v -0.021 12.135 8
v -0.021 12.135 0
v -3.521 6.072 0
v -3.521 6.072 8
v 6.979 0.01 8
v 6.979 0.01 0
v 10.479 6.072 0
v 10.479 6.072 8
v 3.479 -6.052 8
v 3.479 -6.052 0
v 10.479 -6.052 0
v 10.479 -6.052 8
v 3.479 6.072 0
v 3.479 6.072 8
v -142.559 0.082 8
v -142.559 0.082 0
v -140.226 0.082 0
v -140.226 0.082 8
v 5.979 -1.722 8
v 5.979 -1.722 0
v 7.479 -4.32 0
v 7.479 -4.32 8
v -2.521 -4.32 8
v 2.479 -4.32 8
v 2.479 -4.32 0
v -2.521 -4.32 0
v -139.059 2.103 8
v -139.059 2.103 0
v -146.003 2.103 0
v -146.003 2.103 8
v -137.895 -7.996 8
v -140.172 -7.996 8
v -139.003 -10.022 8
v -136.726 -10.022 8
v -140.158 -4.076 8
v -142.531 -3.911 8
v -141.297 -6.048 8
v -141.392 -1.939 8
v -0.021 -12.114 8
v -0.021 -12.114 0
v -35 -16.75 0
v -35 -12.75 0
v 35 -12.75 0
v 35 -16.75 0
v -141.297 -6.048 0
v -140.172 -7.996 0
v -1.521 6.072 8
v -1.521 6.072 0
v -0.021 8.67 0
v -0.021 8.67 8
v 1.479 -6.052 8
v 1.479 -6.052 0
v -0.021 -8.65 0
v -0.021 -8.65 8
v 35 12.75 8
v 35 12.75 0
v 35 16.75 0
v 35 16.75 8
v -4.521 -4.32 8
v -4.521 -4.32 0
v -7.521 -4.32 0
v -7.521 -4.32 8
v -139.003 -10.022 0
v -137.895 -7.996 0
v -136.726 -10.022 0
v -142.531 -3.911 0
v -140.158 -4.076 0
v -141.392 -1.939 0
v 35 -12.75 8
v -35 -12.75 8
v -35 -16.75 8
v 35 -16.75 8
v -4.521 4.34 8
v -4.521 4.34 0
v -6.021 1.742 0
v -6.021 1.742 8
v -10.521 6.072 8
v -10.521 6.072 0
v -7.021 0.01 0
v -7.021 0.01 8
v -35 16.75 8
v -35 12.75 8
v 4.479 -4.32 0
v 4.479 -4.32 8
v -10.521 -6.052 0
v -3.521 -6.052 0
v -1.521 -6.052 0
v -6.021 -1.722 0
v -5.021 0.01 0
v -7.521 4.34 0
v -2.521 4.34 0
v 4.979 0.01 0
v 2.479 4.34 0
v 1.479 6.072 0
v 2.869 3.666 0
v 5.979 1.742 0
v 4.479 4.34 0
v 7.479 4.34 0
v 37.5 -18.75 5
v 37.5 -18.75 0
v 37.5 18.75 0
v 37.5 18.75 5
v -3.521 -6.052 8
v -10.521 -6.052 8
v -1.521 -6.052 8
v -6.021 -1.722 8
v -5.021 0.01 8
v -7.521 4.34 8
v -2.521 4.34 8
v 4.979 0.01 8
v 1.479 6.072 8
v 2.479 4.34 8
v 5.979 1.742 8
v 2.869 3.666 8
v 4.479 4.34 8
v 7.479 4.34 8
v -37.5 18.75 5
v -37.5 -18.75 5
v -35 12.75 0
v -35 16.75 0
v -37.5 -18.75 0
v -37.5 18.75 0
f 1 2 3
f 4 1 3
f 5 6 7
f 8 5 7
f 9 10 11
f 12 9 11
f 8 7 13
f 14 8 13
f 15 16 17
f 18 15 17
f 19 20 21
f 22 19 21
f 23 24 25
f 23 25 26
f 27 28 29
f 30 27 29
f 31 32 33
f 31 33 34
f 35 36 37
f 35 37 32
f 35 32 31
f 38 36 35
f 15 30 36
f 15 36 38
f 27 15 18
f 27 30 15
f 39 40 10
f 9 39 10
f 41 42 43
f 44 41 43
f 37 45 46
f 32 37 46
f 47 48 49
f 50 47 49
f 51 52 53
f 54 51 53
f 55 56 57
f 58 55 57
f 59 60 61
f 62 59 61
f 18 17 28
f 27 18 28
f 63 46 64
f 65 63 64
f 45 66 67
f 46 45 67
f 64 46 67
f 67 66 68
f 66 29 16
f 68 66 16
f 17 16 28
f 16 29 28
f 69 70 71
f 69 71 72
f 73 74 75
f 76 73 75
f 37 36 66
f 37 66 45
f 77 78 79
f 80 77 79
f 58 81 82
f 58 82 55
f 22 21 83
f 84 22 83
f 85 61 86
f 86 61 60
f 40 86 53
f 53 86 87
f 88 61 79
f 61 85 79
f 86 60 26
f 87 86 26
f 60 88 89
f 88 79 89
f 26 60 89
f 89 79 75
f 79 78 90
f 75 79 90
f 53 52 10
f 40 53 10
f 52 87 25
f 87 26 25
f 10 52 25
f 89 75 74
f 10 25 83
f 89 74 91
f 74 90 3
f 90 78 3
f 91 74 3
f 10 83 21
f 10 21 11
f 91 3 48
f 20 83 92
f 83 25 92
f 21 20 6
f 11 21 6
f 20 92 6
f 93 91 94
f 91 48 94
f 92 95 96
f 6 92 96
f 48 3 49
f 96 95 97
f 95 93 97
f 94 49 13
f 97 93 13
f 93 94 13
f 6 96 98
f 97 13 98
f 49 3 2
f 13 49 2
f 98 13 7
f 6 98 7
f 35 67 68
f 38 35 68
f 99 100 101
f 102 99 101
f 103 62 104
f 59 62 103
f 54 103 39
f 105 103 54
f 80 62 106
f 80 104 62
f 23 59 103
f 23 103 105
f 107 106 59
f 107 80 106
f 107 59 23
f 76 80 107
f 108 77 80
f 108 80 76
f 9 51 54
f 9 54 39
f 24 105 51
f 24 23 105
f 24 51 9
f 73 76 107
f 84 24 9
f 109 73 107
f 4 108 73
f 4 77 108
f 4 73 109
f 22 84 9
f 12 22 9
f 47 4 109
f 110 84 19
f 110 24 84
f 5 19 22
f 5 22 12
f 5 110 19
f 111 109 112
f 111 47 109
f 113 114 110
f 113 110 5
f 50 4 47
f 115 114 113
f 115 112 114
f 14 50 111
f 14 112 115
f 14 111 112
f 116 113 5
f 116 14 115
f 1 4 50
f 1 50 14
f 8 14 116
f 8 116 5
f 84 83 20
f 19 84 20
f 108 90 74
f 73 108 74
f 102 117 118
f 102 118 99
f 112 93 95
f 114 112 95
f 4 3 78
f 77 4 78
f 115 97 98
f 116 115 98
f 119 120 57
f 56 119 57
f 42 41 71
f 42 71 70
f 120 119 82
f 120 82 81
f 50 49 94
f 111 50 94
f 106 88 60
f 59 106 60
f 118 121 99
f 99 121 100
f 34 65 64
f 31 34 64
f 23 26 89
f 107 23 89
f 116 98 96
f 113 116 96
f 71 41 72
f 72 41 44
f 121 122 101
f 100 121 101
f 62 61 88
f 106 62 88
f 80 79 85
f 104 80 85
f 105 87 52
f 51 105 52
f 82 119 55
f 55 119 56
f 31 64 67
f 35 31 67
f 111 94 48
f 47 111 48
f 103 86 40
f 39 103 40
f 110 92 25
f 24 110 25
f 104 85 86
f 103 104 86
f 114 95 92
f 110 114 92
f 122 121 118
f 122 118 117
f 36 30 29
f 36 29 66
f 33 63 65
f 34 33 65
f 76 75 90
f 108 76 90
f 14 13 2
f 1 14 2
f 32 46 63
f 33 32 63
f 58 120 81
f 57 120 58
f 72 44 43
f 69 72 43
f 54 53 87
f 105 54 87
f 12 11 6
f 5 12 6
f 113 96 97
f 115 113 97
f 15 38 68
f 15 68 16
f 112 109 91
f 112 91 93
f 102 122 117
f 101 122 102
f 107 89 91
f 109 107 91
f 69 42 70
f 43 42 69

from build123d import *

# Parameters (mm, degrees)
F0_W     = 75
F0_H     = 37.5
F1_DEPTH = 5
F2_W     = 70
F2_H     = 4
F3_DEPTH = 8
F5_DEPTH = 8


with BuildPart() as f1:
    # F0 (on Top) → F1 (new body)
    with BuildSketch(Plane.XY):
        Rectangle(F0_W, F0_H)
    extrude(amount=F1_DEPTH)


with BuildPart() as f3:
    # F2 (on Top) → F3 (new body)
    with BuildSketch(Plane.XY):
        with Locations((0, 14.75)):
            Rectangle(F2_W, F2_H)
    extrude(amount=F3_DEPTH)


with BuildPart() as f3b:
    # F2 (on Top) → F3, piece 2 (new body)
    with BuildSketch(Plane.XY):
        with Locations((0, -14.75)):
            Rectangle(F2_W, F2_H)
    extrude(amount=F3_DEPTH)


with BuildPart() as f5:
    # F4 (on Top) → F5 (new body)
    with BuildSketch(Plane.XY):
        Polygon((-4.520908765, 4.3402844962), (-6.020908765, 1.7422082849), (-7.020908765, 0.0101574773), (-6.020908765, -1.7218933303), (-4.520908765, -4.3199695416), (-3.520908765, -6.0520203492), (-1.520908765, -6.0520203492), (1.479091235, -6.0520203492), (3.479091235, -6.0520203492), (4.479091235, -4.3199695416), (5.979091235, -1.7218933303), (6.979091235, 0.0101574773), (5.979091235, 1.7422082849), (4.479091235, 4.3402844962), (3.479091235, 6.0723353038), (1.479091235, 6.0723353038), (-1.520908765, 6.0723353038), (-3.520908765, 6.0723353038), align=None)
        Polygon((2.479091235, 4.3402844962), (2.8686255467, 3.6655912771), (4.979091235, 0.0101574773), (2.479091235, -4.3199695416), (-2.520908765, -4.3199695416), (-5.020908765, 0.0101574773), (-2.520908765, 4.3402844962), align=None, mode=Mode.SUBTRACT)
        Polygon((-6.020908765, -1.7218933303), (-7.020908765, 0.0101574773), (-10.520908765, -6.0520203492), (-3.520908765, -6.0520203492), (-4.520908765, -4.3199695416), (-7.520908765, -4.3199695416), align=None)
        Polygon((-0.020908765, 12.1345131303), (-3.520908765, 6.0723353038), (-1.520908765, 6.0723353038), (-0.020908765, 8.6704115151), (1.479091235, 6.0723353038), (3.479091235, 6.0723353038), align=None)
        Polygon((10.479091235, 6.0723353038), (3.479091235, 6.0723353038), (4.479091235, 4.3402844962), (7.479091235, 4.3402844962), (5.979091235, 1.7422082849), (6.979091235, 0.0101574773), align=None)
        Polygon((-1.520908765, -6.0520203492), (-3.520908765, -6.0520203492), (-0.020908765, -12.1141981757), (3.479091235, -6.0520203492), (1.479091235, -6.0520203492), (-0.020908765, -8.6500965606), align=None)
        Polygon((-7.020908765, 0.0101574773), (-6.020908765, 1.7422082849), (-7.520908765, 4.3402844962), (-4.520908765, 4.3402844962), (-3.520908765, 6.0723353038), (-10.520908765, 6.0723353038), align=None)
        Polygon((4.479091235, -4.3199695416), (3.479091235, -6.0520203492), (10.479091235, -6.0520203492), (6.979091235, 0.0101574773), (5.979091235, -1.7218933303), (7.479091235, -4.3199695416), align=None)
    extrude(amount=F5_DEPTH)


with BuildPart() as f5b:
    # F4 (on Top) → F5, piece 2 (new body)
    with BuildSketch(Plane.XY):
        Polygon((-146.0028003454, 2.1026803896), (-142.5308886766, -3.9108470201), (-141.3923103412, -1.9387714947), (-142.5589770079, 0.0819544474), (-140.2256436745, 0.0819544474), (-139.0589770079, 2.1026803896), align=None)
        Polygon((-141.3923103412, -1.9387714947), (-142.5308886766, -3.9108470201), (-141.2967720655, -6.0483996931), (-140.15819373, -4.0763241677), align=None)
        Polygon((-140.15819373, -4.0763241677), (-141.2967720655, -6.0483996931), (-140.1720452363, -7.9964837059), (-137.8948885654, -7.9964837059), align=None)
        Polygon((-140.1720452363, -7.9964837059), (-139.0028003454, -10.0216752634), (-136.7256436745, -10.0216752634), (-137.8948885654, -7.9964837059), align=None)
    extrude(amount=F5_DEPTH)


solid = Compound([f1.part, f3.part, f3b.part, f5.part, f5b.part])
